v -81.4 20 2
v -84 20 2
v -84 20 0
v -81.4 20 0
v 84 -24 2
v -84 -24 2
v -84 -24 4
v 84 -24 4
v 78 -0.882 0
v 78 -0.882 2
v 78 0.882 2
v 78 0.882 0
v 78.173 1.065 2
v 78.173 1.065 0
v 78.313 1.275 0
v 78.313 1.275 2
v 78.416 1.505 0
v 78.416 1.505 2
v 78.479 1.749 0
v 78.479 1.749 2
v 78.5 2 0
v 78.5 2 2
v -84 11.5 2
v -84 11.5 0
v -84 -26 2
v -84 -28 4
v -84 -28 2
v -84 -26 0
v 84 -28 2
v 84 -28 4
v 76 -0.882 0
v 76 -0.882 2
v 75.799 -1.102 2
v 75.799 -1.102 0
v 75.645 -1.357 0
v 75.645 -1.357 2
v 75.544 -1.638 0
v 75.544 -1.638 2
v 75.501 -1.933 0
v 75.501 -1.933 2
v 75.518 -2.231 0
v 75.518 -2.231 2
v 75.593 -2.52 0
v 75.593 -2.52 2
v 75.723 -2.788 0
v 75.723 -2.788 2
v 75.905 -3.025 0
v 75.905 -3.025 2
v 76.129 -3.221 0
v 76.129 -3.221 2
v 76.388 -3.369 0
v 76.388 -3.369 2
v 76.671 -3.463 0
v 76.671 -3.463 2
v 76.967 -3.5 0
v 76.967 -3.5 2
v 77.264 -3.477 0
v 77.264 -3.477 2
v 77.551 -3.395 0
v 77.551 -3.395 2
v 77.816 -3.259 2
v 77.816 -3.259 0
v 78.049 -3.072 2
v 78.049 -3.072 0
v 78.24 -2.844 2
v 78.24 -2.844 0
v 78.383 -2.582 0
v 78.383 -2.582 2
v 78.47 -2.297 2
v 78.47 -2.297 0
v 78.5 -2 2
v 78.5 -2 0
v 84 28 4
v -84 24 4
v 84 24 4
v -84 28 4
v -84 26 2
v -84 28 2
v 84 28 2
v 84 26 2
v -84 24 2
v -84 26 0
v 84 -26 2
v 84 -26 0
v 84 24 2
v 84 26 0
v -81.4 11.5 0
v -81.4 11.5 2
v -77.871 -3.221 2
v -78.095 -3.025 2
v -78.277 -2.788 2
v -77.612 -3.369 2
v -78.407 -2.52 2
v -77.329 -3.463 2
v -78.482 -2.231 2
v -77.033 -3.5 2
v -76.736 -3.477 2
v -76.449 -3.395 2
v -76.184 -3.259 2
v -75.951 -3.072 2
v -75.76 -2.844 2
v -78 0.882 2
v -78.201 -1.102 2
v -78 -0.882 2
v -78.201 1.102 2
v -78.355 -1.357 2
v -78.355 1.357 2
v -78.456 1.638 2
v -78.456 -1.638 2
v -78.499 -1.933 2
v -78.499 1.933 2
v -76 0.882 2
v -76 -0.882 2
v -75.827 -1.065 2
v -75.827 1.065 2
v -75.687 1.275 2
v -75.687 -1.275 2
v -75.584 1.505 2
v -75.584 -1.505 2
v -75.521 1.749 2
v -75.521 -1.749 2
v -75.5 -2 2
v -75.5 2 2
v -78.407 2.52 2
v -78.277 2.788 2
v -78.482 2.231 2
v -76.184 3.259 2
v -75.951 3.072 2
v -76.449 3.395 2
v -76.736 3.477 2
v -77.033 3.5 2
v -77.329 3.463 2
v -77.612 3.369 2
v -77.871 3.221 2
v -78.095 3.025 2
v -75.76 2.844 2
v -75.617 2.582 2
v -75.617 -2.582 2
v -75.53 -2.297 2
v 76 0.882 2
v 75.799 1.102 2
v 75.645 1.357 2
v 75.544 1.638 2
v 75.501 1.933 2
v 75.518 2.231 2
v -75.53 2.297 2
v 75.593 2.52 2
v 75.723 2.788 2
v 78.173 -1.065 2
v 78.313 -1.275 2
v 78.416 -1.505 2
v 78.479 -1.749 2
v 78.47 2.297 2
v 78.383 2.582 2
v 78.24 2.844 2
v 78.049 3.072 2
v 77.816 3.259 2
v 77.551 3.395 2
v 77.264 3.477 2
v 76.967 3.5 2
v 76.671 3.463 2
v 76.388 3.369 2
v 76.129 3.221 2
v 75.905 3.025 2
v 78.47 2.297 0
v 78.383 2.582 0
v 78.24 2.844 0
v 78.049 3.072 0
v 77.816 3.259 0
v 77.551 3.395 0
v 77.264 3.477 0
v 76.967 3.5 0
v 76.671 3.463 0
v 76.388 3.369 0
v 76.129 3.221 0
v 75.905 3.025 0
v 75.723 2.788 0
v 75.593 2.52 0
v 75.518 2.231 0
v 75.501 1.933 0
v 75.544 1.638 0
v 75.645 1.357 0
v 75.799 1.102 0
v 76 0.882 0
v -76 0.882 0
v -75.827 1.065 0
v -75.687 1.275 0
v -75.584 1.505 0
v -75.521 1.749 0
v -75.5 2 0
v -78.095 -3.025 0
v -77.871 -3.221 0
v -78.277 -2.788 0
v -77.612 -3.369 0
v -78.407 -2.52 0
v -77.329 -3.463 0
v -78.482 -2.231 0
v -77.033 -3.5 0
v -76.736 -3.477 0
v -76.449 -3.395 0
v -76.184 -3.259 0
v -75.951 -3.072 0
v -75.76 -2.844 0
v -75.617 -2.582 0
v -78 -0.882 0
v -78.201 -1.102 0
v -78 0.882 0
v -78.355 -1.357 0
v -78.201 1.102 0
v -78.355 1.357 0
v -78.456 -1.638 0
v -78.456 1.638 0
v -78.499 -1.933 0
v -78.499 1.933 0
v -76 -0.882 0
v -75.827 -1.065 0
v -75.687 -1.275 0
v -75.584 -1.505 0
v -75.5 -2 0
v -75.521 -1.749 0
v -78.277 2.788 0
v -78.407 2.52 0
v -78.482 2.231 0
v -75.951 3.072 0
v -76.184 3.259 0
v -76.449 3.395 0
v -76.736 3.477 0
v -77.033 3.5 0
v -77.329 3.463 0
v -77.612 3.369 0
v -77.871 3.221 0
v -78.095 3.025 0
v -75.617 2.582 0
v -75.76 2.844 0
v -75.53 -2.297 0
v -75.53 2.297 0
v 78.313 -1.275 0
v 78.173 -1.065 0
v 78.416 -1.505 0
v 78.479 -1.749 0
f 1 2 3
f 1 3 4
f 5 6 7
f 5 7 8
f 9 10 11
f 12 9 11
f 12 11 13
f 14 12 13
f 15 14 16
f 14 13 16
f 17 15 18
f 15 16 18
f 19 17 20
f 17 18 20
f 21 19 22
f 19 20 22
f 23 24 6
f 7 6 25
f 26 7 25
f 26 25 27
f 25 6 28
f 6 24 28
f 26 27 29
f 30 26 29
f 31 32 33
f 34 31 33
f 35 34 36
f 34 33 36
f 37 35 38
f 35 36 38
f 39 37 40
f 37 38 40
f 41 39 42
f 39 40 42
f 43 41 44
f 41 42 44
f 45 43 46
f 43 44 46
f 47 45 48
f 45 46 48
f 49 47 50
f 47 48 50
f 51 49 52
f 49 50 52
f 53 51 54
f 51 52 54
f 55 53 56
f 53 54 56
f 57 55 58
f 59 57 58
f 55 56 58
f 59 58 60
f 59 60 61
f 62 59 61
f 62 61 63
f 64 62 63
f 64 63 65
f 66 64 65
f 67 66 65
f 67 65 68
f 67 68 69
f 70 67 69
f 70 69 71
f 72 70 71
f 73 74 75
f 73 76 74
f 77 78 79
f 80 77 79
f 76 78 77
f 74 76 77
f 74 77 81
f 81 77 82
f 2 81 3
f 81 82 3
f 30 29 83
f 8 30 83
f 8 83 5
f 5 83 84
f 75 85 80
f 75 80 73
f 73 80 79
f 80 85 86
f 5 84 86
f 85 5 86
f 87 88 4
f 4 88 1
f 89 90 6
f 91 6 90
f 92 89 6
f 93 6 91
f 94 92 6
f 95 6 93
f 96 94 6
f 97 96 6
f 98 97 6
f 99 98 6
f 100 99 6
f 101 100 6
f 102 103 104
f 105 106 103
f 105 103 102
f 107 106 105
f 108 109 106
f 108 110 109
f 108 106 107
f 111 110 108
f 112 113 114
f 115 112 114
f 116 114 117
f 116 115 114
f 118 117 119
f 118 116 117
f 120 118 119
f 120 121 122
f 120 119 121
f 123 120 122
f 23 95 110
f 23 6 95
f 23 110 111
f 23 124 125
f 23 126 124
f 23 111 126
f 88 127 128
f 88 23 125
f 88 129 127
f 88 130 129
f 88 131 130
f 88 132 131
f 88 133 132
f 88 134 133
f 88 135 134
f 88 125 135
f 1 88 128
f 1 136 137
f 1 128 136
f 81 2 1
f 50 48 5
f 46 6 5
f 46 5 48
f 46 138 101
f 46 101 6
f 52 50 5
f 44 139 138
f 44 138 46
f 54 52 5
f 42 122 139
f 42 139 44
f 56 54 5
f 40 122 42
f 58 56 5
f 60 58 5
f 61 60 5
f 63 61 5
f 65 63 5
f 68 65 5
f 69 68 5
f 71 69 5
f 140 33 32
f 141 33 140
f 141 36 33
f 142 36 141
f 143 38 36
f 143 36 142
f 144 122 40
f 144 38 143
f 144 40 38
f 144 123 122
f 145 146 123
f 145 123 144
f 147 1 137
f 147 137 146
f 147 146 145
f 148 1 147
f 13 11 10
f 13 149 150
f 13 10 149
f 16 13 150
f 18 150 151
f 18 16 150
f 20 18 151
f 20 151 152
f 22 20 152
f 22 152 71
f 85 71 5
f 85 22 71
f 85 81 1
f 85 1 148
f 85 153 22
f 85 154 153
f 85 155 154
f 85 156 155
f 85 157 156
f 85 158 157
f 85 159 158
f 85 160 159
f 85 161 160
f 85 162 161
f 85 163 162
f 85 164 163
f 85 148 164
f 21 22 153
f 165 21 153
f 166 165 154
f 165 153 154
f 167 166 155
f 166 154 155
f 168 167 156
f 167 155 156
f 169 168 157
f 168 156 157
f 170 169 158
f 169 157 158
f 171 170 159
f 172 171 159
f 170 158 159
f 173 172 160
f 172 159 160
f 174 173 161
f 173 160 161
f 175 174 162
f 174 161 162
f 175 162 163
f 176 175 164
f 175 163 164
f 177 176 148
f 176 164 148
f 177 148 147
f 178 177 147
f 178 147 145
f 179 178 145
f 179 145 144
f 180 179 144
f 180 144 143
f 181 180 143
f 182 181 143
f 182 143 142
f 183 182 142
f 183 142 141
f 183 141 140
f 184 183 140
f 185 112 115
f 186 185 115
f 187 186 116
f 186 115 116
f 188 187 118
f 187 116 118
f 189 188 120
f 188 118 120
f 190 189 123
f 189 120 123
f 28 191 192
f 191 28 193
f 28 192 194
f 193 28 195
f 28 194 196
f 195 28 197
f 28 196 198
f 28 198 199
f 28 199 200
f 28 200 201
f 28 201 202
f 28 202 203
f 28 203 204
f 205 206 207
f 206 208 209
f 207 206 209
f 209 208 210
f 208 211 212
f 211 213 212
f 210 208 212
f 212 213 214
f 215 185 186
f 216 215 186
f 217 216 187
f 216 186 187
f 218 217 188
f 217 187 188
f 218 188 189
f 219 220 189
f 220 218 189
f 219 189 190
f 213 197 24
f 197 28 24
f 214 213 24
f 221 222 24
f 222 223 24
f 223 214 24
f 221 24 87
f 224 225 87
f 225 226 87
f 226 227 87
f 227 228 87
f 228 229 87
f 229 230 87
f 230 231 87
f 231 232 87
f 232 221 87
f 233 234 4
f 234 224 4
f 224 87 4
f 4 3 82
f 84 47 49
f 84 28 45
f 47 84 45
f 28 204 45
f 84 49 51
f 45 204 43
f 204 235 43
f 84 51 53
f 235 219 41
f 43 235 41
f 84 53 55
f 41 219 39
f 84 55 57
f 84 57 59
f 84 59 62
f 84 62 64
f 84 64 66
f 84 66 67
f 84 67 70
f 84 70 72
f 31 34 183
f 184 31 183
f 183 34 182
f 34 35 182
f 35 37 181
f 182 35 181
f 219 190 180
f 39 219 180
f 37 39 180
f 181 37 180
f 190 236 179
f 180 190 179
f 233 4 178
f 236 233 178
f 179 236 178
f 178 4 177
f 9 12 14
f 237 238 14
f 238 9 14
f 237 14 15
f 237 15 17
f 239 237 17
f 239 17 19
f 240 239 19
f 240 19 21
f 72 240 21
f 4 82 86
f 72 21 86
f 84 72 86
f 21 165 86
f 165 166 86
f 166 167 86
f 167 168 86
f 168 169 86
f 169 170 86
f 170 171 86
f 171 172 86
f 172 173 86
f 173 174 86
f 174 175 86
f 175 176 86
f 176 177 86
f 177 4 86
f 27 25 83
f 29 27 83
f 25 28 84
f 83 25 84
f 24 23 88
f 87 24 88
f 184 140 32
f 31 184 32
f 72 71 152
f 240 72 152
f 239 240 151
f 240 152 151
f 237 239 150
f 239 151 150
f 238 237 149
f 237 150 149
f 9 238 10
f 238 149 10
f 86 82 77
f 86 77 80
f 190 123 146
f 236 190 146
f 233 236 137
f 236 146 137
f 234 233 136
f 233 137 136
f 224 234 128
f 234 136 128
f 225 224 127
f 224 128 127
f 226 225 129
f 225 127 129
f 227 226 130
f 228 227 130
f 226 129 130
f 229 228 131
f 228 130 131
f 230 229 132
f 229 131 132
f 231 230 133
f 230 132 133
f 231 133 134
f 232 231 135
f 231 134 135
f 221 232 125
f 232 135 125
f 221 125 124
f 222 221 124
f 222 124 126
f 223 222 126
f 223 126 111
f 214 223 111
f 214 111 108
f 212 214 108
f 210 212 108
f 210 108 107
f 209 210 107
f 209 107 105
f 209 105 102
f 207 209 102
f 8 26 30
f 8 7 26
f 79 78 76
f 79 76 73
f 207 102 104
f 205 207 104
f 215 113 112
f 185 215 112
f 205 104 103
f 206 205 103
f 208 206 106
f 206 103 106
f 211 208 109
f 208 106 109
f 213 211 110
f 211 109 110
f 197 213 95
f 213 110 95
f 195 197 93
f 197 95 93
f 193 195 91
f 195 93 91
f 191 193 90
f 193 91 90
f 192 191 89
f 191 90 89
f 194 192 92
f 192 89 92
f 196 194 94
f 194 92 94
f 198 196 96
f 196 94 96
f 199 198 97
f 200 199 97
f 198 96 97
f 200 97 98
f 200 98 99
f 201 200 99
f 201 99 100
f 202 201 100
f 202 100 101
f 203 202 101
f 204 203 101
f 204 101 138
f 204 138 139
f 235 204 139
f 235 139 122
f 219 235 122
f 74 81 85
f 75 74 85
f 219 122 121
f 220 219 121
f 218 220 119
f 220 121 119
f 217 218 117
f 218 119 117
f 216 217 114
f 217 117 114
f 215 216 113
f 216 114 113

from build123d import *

# Parameters (mm, degrees)
F0_W     = 168
F0_H     = 52
F1_DEPTH = 2
F2_W     = 168
F2_H     = 2
F3_DEPTH = 2
F5_DEPTH = 25
F6_W     = 2.6
F6_H     = 8.5
F7_DEPTH = 25


with BuildPart() as f1:
    # F0 (on Top) → F1 (new body)
    with BuildSketch(Plane.XY):
        Rectangle(F0_W, F0_H)
    extrude(amount=F1_DEPTH)

    # F2 (on face) → F3 (join)
    with BuildSketch(Plane.XY.offset(2)):
        with Locations((0, -27)):
            Rectangle(F2_W, F2_H)
        with Locations((0, -25)):
            Rectangle(F2_W, F2_H)
        with Locations((0, 25)):
            Rectangle(F2_W, F2_H)
        with Locations((0, 27)):
            Rectangle(F2_W, F2_H)
    extrude(amount=F3_DEPTH)

    # F4 (on face) → F5 (cut)
    with BuildSketch(Plane.XY.offset(2)):
        with BuildLine():
            ThreePointArc((78.5, -2), (78.369306, -1.387628), (78, -0.881966))
            ThreePointArc((78, -0.881966), (77, -0.5), (76, -0.881966))
            ThreePointArc((76, -0.881966), (76.387628, -3.369306), (78.5, -2))
        make_face()
        with BuildLine():
            Line((78, -0.881966), (78, 0.881966))
            ThreePointArc((78, 0.881966), (77, 0.5), (76, 0.881966))
            Line((76, 0.881966), (76, -0.881966))
            ThreePointArc((76, -0.881966), (77, -0.5), (78, -0.881966))
        make_face()
        with BuildLine():
            ThreePointArc((76, 0.881966), (77, 0.5), (78, 0.881966))
            ThreePointArc((78, 0.881966), (78.369306, 1.387628), (78.5, 2))
            ThreePointArc((78.5, 2), (76.387628, 3.369306), (76, 0.881966))
        make_face()
        with BuildLine():
            ThreePointArc((-78, -0.881966), (-77.612372, -3.369306), (-75.5, -2))
            ThreePointArc((-75.5, -2), (-75.630694, -1.387628), (-76, -0.881966))
            ThreePointArc((-76, -0.881966), (-77, -0.5), (-78, -0.881966))
        make_face()
        with BuildLine():
            ThreePointArc((-78, -0.881966), (-77, -0.5), (-76, -0.881966))
            Line((-76, -0.881966), (-76, 0.881966))
            ThreePointArc((-76, 0.881966), (-77, 0.5), (-78, 0.881966))
            Line((-78, 0.881966), (-78, -0.881966))
        make_face()
        with BuildLine():
            ThreePointArc((-78, 0.881966), (-77, 0.5), (-76, 0.881966))
            ThreePointArc((-76, 0.881966), (-75.630694, 1.387628), (-75.5, 2))
            ThreePointArc((-75.5, 2), (-77.612372, 3.369306), (-78, 0.881966))
        make_face()
    extrude(amount=-F5_DEPTH, mode=Mode.SUBTRACT)

    # F6 (on face) → F7 (cut)
    with BuildSketch(Plane.XY.offset(2)):
        with Locations((-82.7, 15.75)):
            Rectangle(F6_W, F6_H)
    extrude(amount=-F7_DEPTH, mode=Mode.SUBTRACT)


solid = f1.part
